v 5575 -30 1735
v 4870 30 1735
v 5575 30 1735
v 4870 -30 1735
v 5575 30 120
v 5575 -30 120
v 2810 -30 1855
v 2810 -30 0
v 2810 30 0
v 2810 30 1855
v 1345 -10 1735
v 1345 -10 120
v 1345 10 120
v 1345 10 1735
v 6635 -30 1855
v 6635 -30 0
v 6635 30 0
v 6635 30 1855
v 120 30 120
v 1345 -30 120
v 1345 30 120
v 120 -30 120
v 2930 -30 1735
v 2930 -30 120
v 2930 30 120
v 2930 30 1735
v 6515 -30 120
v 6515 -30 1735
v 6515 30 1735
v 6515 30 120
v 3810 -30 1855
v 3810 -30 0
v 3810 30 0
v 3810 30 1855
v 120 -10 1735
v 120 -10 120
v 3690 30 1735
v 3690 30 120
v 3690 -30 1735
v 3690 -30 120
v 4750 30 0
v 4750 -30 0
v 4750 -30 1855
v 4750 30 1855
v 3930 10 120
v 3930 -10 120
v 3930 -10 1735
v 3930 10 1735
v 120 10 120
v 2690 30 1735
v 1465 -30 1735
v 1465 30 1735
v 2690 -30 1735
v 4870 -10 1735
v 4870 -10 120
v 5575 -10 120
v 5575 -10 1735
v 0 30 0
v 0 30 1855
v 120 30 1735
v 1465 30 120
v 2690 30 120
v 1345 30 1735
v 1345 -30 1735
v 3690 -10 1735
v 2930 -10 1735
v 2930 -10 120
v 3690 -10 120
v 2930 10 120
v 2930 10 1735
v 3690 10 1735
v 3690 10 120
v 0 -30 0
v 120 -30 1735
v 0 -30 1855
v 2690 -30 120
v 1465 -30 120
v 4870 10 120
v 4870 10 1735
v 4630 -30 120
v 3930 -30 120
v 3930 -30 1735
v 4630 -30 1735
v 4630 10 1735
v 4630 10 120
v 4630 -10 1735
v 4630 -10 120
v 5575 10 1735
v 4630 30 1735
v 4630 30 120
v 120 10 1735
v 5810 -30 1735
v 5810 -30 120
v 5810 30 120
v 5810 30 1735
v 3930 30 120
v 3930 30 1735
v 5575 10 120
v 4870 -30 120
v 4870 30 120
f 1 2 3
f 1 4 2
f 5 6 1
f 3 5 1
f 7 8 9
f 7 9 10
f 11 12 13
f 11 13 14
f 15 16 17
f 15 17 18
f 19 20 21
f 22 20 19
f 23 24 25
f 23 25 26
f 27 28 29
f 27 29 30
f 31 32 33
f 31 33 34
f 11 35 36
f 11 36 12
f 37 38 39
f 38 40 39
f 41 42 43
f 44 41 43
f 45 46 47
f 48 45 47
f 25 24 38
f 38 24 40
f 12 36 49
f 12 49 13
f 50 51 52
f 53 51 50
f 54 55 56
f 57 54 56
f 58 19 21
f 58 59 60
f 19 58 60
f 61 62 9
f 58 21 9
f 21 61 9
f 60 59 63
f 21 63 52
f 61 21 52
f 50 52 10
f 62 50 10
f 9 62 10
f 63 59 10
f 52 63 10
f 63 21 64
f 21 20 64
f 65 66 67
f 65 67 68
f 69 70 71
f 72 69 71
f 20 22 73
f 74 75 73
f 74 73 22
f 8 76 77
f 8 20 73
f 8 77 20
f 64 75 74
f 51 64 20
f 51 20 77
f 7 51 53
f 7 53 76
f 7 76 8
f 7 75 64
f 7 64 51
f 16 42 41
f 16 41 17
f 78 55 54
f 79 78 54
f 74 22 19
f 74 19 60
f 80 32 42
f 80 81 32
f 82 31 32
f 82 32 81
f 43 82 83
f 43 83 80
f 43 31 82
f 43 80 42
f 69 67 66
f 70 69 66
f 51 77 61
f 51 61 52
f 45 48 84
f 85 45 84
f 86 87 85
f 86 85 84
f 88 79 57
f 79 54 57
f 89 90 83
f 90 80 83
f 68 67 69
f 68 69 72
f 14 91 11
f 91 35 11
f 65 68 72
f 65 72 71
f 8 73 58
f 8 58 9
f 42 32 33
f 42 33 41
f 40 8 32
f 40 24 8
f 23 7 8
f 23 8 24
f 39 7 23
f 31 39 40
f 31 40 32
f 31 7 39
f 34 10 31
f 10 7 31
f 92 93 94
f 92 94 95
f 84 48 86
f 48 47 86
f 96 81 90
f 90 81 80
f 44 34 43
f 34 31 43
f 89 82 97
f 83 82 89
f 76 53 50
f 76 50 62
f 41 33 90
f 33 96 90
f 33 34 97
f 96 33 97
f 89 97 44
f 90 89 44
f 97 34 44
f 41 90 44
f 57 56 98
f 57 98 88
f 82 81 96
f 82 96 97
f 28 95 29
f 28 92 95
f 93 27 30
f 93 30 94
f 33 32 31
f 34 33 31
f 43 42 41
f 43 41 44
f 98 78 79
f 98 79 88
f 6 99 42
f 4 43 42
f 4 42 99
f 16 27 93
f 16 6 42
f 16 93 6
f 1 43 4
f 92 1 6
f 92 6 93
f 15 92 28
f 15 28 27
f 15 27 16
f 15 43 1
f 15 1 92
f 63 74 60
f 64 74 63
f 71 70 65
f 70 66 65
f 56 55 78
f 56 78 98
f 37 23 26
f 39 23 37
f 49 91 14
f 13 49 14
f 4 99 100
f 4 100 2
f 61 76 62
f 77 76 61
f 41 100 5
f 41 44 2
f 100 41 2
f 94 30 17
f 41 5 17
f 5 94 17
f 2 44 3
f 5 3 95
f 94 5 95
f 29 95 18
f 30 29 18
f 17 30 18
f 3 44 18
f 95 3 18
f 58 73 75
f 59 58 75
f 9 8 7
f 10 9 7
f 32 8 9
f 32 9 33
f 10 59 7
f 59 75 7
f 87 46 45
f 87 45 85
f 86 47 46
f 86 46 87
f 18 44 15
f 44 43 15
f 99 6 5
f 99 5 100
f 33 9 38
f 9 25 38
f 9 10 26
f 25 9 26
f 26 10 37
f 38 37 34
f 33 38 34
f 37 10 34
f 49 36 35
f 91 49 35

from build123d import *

# Parameters (mm, degrees)
F0_W     = 2810
F0_H     = 1855
F0_W_2   = 120
F0_H_2   = 1615
F1_DEPTH = 30
F0_W_3   = 1225
F2_DEPTH = 10
F0_W_4   = 1000
F0_W_5   = 760
F3_DEPTH = 30
F4_DEPTH = 10
F0_W_6   = 940
F0_W_7   = 700
F5_DEPTH = 30
F6_DEPTH = 10
F0_W_8   = 1885
F0_W_9   = 117.5
F7_DEPTH = 30
F0_W_10  = 705
F8_DEPTH = 10


with BuildPart() as f1:
    # F0 (on Front) → F1 (new body, symmetric)
    with BuildSketch(Plane.XZ):
        with Locations((1405, 927.5)):
            Rectangle(F0_W, F0_H)
        Polygon((120, 120), (120, 1735), (1345, 1735), (1465, 1735), (2690, 1735), (2690, 120), (1465, 120), (1345, 120), align=None, mode=Mode.SUBTRACT)
        with Locations((1405, 927.5)):
            Rectangle(F0_W_2, F0_H_2)
    extrude(amount=F1_DEPTH, both=True)


with BuildPart() as f2:
    # F0 (on Front) → F2 (new body, symmetric)
    with BuildSketch(Plane.XZ):
        with Locations((732.5, 927.5)):
            Rectangle(F0_W_3, F0_H_2)
    extrude(amount=F2_DEPTH, both=True)


with BuildPart() as f3:
    # F0 (on Front) → F3 (new body, symmetric)
    with BuildSketch(Plane.XZ):
        with Locations((3310, 927.5)):
            Rectangle(F0_W_4, F0_H)
        with Locations((3310, 927.5)):
            Rectangle(F0_W_5, F0_H_2, mode=Mode.SUBTRACT)
    extrude(amount=F3_DEPTH, both=True)


with BuildPart() as f4:
    # F0 (on Front) → F4 (new body, symmetric)
    with BuildSketch(Plane.XZ):
        with Locations((3310, 927.5)):
            Rectangle(F0_W_5, F0_H_2)
    extrude(amount=F4_DEPTH, both=True)


with BuildPart() as f5:
    # F0 (on Front) → F5 (new body, symmetric)
    with BuildSketch(Plane.XZ):
        with Locations((4280, 927.5)):
            Rectangle(F0_W_6, F0_H)
        with Locations((4280, 927.5)):
            Rectangle(F0_W_7, F0_H_2, mode=Mode.SUBTRACT)
    extrude(amount=F5_DEPTH, both=True)


with BuildPart() as f6:
    # F0 (on Front) → F6 (new body, symmetric)
    with BuildSketch(Plane.XZ):
        with Locations((4280, 927.5)):
            Rectangle(F0_W_7, F0_H_2)
    extrude(amount=F6_DEPTH, both=True)


with BuildPart() as f7:
    # F0 (on Front) → F7 (new body, symmetric)
    with BuildSketch(Plane.XZ):
        with Locations((5692.5, 927.5)):
            Rectangle(F0_W_8, F0_H)
        Polygon((5810, 1735), (6515, 1735), (6515, 120), (5810, 120), (5692.5, 120), (5575, 120), (4870, 120), (4870, 1735), (5575, 1735), (5692.5, 1735), align=None, mode=Mode.SUBTRACT)
        with Locations((5633.75, 927.5)):
            Rectangle(F0_W_9, F0_H_2)
        with Locations((5751.25, 927.5)):
            Rectangle(F0_W_9, F0_H_2)
    extrude(amount=F7_DEPTH, both=True)


with BuildPart() as f8:
    # F0 (on Front) → F8 (new body, symmetric)
    with BuildSketch(Plane.XZ):
        with Locations((5222.5, 927.5)):
            Rectangle(F0_W_10, F0_H_2)
    extrude(amount=F8_DEPTH, both=True)


solid = Compound([f1.part, f2.part, f3.part, f4.part, f5.part, f6.part, f7.part, f8.part])
